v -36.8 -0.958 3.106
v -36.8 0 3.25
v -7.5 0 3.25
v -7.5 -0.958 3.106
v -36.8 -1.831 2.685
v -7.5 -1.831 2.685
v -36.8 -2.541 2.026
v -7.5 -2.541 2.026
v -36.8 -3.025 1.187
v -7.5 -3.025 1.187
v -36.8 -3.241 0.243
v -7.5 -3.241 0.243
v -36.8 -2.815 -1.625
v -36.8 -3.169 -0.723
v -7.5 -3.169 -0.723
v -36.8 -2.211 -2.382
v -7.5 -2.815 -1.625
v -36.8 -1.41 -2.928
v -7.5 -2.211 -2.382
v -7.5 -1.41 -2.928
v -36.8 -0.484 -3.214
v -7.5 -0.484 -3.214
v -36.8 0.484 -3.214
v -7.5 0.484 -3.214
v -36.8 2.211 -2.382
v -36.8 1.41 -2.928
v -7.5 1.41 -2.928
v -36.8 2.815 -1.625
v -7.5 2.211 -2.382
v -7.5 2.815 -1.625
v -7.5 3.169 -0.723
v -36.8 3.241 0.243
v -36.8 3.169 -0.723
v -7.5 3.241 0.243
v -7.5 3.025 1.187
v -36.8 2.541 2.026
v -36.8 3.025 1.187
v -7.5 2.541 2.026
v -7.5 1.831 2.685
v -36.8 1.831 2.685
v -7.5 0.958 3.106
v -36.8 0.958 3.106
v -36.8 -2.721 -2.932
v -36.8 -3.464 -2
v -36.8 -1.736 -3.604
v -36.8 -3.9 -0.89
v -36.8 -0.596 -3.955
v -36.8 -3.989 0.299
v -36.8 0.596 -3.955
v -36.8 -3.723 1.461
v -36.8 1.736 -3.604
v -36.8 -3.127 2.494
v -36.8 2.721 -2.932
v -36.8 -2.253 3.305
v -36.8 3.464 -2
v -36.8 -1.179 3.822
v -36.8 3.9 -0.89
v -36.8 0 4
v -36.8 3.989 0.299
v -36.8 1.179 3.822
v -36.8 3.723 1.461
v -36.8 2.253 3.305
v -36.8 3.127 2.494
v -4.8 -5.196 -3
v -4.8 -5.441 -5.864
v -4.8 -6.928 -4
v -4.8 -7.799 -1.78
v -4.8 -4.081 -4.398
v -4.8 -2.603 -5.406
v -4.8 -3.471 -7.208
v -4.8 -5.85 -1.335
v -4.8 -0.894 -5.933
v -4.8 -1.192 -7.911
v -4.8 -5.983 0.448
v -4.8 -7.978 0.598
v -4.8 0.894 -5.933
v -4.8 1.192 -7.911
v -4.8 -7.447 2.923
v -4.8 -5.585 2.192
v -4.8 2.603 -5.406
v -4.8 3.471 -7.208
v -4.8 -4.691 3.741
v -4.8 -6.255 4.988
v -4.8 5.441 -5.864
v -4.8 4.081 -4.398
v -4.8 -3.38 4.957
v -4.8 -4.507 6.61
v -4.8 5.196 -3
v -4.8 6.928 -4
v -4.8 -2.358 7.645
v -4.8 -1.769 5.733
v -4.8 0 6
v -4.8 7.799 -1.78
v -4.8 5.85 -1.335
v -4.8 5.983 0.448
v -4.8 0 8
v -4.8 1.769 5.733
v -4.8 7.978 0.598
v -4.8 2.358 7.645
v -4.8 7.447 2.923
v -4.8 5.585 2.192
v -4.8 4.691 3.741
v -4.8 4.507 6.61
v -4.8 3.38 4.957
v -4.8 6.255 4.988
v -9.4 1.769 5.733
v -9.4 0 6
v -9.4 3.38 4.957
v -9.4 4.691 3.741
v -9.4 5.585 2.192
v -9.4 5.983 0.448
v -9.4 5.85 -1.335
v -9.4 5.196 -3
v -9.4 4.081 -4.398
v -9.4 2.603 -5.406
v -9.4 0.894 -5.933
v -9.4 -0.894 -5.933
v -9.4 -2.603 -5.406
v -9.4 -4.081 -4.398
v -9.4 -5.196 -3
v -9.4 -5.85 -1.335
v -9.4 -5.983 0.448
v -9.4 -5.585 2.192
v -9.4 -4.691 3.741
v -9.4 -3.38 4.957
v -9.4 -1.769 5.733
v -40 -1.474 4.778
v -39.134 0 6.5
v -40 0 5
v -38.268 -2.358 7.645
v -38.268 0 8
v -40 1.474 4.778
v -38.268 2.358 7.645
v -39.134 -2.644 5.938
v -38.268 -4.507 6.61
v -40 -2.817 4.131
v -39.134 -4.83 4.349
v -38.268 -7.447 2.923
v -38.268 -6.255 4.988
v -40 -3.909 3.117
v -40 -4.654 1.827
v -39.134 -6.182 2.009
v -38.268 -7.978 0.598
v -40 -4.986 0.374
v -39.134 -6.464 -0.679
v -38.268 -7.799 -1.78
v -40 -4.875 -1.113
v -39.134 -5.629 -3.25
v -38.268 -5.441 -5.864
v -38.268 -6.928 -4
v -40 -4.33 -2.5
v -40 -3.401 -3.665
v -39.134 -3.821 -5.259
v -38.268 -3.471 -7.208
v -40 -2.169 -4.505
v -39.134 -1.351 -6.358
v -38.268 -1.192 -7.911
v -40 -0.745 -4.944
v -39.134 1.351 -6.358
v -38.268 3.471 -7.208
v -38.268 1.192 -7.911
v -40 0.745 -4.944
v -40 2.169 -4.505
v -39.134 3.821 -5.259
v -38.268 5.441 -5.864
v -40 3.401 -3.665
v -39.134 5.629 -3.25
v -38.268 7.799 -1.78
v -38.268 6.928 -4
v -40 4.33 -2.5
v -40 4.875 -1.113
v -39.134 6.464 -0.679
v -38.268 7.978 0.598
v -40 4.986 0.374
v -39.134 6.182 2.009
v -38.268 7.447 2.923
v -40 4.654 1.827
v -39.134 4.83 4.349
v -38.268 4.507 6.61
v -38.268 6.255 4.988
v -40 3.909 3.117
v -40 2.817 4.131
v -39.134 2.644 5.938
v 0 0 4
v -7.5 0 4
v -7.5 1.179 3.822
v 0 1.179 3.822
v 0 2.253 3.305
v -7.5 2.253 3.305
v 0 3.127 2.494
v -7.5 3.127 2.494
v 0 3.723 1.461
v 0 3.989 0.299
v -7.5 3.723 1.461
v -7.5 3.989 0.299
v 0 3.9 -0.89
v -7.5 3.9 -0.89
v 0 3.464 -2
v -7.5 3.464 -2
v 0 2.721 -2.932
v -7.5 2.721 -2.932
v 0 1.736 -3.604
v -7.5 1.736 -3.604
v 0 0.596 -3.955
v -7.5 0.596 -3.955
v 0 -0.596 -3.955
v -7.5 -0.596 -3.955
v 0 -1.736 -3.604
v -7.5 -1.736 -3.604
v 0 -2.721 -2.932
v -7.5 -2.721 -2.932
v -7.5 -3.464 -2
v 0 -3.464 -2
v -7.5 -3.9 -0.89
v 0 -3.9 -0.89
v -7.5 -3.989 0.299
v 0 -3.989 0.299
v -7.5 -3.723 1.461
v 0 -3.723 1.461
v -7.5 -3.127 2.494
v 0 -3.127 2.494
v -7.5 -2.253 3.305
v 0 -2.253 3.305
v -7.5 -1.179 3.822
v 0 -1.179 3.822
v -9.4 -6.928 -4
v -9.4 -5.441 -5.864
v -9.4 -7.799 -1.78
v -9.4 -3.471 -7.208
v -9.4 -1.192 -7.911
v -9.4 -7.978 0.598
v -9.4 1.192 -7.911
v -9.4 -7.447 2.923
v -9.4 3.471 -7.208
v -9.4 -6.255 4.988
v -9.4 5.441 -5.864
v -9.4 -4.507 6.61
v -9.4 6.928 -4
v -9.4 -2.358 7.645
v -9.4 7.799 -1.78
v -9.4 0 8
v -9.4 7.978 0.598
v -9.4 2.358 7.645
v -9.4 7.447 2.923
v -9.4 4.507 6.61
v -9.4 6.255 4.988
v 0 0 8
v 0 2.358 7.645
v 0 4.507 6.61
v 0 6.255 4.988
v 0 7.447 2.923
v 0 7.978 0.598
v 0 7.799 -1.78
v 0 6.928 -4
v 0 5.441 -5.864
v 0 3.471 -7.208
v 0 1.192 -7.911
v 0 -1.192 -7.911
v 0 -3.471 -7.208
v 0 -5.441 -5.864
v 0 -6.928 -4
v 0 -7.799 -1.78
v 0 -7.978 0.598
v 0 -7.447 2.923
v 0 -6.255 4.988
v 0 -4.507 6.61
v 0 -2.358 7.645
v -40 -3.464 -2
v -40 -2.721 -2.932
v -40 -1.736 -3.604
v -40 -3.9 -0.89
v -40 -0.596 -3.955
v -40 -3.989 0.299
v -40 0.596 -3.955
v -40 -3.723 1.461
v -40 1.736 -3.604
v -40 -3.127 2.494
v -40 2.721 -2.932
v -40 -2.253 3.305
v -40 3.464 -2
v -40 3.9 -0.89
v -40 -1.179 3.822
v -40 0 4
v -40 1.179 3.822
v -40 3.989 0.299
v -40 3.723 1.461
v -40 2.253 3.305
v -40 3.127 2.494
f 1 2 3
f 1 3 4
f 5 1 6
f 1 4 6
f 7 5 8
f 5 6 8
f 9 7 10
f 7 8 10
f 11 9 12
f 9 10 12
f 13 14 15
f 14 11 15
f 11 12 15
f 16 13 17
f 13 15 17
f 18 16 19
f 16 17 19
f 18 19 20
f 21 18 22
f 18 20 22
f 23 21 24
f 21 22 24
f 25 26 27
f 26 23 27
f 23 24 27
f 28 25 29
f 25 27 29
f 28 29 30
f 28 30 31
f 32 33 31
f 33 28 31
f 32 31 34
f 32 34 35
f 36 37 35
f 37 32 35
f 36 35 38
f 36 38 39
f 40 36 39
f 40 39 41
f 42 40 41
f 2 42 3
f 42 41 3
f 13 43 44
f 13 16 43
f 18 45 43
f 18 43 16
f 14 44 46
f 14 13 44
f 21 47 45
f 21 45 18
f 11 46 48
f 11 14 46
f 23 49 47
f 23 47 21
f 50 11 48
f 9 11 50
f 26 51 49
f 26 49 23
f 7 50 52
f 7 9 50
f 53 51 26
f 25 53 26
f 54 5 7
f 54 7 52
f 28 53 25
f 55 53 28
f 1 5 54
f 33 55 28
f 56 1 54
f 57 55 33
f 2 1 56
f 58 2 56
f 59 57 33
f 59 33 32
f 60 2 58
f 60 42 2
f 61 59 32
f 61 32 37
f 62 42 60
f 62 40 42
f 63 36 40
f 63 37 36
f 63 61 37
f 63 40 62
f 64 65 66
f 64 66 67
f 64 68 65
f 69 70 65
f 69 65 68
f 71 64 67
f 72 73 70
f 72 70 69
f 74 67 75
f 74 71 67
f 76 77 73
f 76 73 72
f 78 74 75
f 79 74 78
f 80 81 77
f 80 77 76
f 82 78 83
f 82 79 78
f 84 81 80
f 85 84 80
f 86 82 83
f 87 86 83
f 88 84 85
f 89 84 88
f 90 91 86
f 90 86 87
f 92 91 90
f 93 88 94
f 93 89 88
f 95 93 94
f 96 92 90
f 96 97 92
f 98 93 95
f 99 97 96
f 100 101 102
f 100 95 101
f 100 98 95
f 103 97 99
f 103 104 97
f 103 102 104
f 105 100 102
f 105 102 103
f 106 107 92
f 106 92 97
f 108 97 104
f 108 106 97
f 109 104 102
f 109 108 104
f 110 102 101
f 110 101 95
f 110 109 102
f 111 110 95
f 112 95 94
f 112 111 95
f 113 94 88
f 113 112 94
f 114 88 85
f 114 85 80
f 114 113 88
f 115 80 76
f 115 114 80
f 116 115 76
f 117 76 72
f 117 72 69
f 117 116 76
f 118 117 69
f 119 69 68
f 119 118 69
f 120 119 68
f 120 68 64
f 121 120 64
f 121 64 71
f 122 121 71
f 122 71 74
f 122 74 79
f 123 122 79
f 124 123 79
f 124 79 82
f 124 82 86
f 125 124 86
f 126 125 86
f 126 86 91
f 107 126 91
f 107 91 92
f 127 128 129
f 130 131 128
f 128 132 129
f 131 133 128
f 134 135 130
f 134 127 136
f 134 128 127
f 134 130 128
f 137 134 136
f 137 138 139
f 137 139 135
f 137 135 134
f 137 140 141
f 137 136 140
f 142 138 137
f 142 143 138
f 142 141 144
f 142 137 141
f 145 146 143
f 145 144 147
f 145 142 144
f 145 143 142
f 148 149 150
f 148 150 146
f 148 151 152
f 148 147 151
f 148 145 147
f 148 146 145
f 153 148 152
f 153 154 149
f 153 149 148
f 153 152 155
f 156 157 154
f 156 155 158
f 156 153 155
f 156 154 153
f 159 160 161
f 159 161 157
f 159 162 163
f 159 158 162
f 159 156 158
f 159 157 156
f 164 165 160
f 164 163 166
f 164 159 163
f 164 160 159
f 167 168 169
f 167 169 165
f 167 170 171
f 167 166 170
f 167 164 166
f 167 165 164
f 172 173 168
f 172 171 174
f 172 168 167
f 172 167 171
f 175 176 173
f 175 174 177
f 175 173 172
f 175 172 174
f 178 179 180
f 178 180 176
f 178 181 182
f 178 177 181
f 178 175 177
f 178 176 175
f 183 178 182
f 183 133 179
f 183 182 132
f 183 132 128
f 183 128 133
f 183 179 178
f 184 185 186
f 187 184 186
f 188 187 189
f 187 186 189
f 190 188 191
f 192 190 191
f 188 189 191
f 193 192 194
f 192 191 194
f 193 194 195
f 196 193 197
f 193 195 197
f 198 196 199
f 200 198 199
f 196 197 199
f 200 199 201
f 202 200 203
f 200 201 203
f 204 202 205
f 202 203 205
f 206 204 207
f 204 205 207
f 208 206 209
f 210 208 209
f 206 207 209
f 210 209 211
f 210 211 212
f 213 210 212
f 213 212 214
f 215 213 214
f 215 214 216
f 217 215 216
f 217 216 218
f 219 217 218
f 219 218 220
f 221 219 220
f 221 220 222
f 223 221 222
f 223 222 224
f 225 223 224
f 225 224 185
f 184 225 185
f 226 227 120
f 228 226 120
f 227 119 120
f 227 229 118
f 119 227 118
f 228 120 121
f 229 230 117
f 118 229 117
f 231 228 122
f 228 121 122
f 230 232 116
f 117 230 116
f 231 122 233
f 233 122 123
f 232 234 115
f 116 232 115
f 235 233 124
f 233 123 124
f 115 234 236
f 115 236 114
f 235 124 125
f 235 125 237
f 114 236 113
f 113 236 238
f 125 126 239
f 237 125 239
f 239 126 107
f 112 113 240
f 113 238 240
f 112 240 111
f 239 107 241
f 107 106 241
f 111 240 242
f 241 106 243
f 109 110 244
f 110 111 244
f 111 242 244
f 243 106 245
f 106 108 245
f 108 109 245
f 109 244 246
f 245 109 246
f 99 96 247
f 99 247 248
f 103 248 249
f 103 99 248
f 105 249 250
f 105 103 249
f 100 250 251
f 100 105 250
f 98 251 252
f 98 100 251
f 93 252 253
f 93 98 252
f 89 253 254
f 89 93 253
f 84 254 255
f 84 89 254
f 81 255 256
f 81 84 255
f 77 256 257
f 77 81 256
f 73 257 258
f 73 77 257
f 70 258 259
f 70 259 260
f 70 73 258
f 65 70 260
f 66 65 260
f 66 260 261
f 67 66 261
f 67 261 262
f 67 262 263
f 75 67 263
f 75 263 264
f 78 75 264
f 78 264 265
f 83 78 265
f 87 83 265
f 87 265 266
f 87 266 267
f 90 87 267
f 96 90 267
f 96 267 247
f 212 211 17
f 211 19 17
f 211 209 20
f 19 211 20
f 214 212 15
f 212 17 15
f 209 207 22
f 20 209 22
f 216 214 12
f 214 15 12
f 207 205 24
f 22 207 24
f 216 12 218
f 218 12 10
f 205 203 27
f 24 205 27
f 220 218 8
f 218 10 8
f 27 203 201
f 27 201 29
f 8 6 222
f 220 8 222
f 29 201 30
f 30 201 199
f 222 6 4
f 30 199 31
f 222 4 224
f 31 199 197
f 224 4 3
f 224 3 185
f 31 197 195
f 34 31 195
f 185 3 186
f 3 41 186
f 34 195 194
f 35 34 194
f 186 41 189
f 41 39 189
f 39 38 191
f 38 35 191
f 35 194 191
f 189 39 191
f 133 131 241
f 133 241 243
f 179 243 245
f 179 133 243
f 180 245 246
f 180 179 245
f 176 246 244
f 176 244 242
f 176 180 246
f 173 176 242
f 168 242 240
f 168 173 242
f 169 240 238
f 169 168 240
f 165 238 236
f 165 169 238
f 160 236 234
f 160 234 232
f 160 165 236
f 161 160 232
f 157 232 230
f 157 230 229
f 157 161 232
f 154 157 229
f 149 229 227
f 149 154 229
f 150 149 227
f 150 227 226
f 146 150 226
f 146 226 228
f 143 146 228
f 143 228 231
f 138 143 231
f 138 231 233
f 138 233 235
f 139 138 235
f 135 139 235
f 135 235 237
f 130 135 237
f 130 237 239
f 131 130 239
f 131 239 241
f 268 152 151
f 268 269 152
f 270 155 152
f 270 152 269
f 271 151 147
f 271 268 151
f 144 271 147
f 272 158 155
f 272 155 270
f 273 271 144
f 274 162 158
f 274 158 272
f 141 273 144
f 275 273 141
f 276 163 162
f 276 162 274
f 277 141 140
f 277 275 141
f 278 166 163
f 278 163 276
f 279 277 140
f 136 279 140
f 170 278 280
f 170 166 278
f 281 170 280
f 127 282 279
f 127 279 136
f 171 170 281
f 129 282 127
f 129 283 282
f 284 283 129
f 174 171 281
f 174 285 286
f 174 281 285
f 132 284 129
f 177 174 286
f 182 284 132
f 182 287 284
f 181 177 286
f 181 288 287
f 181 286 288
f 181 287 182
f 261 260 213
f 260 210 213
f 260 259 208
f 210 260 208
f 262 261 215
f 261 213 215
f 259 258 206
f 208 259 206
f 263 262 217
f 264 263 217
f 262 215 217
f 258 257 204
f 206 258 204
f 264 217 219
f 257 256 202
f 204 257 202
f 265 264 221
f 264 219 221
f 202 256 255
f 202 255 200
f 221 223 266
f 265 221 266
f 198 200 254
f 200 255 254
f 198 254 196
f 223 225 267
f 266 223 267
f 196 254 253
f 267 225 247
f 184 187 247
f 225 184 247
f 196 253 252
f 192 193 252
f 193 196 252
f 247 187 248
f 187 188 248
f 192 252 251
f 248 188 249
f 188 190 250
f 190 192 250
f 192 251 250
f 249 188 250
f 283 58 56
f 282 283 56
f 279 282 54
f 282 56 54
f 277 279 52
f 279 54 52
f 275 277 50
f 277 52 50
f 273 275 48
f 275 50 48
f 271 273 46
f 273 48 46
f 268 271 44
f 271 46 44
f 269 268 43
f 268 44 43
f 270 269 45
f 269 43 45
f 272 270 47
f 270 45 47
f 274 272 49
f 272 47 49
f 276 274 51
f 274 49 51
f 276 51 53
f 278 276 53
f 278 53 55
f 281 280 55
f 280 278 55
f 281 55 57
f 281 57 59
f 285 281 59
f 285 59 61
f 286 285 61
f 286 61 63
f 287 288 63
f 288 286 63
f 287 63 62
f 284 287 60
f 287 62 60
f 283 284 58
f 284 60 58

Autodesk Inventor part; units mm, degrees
ref_plane "YZ Plane" through (0, 0, 0) normal (1, 0, 0) x (0, 1, 0)
ref_plane "XZ Plane" through (0, 0, 0) normal (0, 1, 0) x (-1, 0, 0)
ref_plane "XY Plane" through (0, 0, 0) normal (0, 0, 1) x (1, 0, 0)
sketch "Sketch1" plane through (0, 0, 0) normal (0, 1, 0) x (-1, 0, 0)
  line L0 (0, 4) -> (0, 8)
  line L1 (0, 8) -> (4.8, 8)
  line L2 (4.8, 8) -> (4.8, 6)
  line L3 (4.8, 6) -> (9.4, 6)
  line L4 (9.4, 6) -> (9.4, 8)
  line L5 (9.4, 8) -> (38.2679, 8)
  line L6 (0, 4) -> (7.5, 4)
  line L7 (7.5, 4) -> (7.5, 3.25)
  line L8 (40, 4) -> (36.8, 4)
  line L9 (36.8, 4) -> (36.8, 3.25)
  line L10 (40, 4) -> (40, 5)
  line L11 (38.2679, 8) -> (40, 5)
  line L12 (36.8, 3.25) -> (7.5, 3.25)
  line L13 (0, 0) -> (40, 0) construction
  dimension "d0" = 8
  dimension "d1" = 4.8
  dimension "d3" = 4.6
  dimension "d10" = 2
  dimension "d11" = 2
  dimension "d12" = 7.5
  dimension "d13" = 4
  dimension "d14" = 3.25
  dimension "d15" = 3.2
  dimension "d16" = 4
  dimension "d19" = 3.25
  dimension "d20" = 120
  dimension "d21" = 40
  dimension "d22" = 5
  dimension "d23" = 40
revolve "Revolution1" add sketch "Sketch1" angle 360 about axis through (0, 0, 0) along (-1, 0, 0)
properties part number "NozzleHolder" material "Polyethylene, High Density"
